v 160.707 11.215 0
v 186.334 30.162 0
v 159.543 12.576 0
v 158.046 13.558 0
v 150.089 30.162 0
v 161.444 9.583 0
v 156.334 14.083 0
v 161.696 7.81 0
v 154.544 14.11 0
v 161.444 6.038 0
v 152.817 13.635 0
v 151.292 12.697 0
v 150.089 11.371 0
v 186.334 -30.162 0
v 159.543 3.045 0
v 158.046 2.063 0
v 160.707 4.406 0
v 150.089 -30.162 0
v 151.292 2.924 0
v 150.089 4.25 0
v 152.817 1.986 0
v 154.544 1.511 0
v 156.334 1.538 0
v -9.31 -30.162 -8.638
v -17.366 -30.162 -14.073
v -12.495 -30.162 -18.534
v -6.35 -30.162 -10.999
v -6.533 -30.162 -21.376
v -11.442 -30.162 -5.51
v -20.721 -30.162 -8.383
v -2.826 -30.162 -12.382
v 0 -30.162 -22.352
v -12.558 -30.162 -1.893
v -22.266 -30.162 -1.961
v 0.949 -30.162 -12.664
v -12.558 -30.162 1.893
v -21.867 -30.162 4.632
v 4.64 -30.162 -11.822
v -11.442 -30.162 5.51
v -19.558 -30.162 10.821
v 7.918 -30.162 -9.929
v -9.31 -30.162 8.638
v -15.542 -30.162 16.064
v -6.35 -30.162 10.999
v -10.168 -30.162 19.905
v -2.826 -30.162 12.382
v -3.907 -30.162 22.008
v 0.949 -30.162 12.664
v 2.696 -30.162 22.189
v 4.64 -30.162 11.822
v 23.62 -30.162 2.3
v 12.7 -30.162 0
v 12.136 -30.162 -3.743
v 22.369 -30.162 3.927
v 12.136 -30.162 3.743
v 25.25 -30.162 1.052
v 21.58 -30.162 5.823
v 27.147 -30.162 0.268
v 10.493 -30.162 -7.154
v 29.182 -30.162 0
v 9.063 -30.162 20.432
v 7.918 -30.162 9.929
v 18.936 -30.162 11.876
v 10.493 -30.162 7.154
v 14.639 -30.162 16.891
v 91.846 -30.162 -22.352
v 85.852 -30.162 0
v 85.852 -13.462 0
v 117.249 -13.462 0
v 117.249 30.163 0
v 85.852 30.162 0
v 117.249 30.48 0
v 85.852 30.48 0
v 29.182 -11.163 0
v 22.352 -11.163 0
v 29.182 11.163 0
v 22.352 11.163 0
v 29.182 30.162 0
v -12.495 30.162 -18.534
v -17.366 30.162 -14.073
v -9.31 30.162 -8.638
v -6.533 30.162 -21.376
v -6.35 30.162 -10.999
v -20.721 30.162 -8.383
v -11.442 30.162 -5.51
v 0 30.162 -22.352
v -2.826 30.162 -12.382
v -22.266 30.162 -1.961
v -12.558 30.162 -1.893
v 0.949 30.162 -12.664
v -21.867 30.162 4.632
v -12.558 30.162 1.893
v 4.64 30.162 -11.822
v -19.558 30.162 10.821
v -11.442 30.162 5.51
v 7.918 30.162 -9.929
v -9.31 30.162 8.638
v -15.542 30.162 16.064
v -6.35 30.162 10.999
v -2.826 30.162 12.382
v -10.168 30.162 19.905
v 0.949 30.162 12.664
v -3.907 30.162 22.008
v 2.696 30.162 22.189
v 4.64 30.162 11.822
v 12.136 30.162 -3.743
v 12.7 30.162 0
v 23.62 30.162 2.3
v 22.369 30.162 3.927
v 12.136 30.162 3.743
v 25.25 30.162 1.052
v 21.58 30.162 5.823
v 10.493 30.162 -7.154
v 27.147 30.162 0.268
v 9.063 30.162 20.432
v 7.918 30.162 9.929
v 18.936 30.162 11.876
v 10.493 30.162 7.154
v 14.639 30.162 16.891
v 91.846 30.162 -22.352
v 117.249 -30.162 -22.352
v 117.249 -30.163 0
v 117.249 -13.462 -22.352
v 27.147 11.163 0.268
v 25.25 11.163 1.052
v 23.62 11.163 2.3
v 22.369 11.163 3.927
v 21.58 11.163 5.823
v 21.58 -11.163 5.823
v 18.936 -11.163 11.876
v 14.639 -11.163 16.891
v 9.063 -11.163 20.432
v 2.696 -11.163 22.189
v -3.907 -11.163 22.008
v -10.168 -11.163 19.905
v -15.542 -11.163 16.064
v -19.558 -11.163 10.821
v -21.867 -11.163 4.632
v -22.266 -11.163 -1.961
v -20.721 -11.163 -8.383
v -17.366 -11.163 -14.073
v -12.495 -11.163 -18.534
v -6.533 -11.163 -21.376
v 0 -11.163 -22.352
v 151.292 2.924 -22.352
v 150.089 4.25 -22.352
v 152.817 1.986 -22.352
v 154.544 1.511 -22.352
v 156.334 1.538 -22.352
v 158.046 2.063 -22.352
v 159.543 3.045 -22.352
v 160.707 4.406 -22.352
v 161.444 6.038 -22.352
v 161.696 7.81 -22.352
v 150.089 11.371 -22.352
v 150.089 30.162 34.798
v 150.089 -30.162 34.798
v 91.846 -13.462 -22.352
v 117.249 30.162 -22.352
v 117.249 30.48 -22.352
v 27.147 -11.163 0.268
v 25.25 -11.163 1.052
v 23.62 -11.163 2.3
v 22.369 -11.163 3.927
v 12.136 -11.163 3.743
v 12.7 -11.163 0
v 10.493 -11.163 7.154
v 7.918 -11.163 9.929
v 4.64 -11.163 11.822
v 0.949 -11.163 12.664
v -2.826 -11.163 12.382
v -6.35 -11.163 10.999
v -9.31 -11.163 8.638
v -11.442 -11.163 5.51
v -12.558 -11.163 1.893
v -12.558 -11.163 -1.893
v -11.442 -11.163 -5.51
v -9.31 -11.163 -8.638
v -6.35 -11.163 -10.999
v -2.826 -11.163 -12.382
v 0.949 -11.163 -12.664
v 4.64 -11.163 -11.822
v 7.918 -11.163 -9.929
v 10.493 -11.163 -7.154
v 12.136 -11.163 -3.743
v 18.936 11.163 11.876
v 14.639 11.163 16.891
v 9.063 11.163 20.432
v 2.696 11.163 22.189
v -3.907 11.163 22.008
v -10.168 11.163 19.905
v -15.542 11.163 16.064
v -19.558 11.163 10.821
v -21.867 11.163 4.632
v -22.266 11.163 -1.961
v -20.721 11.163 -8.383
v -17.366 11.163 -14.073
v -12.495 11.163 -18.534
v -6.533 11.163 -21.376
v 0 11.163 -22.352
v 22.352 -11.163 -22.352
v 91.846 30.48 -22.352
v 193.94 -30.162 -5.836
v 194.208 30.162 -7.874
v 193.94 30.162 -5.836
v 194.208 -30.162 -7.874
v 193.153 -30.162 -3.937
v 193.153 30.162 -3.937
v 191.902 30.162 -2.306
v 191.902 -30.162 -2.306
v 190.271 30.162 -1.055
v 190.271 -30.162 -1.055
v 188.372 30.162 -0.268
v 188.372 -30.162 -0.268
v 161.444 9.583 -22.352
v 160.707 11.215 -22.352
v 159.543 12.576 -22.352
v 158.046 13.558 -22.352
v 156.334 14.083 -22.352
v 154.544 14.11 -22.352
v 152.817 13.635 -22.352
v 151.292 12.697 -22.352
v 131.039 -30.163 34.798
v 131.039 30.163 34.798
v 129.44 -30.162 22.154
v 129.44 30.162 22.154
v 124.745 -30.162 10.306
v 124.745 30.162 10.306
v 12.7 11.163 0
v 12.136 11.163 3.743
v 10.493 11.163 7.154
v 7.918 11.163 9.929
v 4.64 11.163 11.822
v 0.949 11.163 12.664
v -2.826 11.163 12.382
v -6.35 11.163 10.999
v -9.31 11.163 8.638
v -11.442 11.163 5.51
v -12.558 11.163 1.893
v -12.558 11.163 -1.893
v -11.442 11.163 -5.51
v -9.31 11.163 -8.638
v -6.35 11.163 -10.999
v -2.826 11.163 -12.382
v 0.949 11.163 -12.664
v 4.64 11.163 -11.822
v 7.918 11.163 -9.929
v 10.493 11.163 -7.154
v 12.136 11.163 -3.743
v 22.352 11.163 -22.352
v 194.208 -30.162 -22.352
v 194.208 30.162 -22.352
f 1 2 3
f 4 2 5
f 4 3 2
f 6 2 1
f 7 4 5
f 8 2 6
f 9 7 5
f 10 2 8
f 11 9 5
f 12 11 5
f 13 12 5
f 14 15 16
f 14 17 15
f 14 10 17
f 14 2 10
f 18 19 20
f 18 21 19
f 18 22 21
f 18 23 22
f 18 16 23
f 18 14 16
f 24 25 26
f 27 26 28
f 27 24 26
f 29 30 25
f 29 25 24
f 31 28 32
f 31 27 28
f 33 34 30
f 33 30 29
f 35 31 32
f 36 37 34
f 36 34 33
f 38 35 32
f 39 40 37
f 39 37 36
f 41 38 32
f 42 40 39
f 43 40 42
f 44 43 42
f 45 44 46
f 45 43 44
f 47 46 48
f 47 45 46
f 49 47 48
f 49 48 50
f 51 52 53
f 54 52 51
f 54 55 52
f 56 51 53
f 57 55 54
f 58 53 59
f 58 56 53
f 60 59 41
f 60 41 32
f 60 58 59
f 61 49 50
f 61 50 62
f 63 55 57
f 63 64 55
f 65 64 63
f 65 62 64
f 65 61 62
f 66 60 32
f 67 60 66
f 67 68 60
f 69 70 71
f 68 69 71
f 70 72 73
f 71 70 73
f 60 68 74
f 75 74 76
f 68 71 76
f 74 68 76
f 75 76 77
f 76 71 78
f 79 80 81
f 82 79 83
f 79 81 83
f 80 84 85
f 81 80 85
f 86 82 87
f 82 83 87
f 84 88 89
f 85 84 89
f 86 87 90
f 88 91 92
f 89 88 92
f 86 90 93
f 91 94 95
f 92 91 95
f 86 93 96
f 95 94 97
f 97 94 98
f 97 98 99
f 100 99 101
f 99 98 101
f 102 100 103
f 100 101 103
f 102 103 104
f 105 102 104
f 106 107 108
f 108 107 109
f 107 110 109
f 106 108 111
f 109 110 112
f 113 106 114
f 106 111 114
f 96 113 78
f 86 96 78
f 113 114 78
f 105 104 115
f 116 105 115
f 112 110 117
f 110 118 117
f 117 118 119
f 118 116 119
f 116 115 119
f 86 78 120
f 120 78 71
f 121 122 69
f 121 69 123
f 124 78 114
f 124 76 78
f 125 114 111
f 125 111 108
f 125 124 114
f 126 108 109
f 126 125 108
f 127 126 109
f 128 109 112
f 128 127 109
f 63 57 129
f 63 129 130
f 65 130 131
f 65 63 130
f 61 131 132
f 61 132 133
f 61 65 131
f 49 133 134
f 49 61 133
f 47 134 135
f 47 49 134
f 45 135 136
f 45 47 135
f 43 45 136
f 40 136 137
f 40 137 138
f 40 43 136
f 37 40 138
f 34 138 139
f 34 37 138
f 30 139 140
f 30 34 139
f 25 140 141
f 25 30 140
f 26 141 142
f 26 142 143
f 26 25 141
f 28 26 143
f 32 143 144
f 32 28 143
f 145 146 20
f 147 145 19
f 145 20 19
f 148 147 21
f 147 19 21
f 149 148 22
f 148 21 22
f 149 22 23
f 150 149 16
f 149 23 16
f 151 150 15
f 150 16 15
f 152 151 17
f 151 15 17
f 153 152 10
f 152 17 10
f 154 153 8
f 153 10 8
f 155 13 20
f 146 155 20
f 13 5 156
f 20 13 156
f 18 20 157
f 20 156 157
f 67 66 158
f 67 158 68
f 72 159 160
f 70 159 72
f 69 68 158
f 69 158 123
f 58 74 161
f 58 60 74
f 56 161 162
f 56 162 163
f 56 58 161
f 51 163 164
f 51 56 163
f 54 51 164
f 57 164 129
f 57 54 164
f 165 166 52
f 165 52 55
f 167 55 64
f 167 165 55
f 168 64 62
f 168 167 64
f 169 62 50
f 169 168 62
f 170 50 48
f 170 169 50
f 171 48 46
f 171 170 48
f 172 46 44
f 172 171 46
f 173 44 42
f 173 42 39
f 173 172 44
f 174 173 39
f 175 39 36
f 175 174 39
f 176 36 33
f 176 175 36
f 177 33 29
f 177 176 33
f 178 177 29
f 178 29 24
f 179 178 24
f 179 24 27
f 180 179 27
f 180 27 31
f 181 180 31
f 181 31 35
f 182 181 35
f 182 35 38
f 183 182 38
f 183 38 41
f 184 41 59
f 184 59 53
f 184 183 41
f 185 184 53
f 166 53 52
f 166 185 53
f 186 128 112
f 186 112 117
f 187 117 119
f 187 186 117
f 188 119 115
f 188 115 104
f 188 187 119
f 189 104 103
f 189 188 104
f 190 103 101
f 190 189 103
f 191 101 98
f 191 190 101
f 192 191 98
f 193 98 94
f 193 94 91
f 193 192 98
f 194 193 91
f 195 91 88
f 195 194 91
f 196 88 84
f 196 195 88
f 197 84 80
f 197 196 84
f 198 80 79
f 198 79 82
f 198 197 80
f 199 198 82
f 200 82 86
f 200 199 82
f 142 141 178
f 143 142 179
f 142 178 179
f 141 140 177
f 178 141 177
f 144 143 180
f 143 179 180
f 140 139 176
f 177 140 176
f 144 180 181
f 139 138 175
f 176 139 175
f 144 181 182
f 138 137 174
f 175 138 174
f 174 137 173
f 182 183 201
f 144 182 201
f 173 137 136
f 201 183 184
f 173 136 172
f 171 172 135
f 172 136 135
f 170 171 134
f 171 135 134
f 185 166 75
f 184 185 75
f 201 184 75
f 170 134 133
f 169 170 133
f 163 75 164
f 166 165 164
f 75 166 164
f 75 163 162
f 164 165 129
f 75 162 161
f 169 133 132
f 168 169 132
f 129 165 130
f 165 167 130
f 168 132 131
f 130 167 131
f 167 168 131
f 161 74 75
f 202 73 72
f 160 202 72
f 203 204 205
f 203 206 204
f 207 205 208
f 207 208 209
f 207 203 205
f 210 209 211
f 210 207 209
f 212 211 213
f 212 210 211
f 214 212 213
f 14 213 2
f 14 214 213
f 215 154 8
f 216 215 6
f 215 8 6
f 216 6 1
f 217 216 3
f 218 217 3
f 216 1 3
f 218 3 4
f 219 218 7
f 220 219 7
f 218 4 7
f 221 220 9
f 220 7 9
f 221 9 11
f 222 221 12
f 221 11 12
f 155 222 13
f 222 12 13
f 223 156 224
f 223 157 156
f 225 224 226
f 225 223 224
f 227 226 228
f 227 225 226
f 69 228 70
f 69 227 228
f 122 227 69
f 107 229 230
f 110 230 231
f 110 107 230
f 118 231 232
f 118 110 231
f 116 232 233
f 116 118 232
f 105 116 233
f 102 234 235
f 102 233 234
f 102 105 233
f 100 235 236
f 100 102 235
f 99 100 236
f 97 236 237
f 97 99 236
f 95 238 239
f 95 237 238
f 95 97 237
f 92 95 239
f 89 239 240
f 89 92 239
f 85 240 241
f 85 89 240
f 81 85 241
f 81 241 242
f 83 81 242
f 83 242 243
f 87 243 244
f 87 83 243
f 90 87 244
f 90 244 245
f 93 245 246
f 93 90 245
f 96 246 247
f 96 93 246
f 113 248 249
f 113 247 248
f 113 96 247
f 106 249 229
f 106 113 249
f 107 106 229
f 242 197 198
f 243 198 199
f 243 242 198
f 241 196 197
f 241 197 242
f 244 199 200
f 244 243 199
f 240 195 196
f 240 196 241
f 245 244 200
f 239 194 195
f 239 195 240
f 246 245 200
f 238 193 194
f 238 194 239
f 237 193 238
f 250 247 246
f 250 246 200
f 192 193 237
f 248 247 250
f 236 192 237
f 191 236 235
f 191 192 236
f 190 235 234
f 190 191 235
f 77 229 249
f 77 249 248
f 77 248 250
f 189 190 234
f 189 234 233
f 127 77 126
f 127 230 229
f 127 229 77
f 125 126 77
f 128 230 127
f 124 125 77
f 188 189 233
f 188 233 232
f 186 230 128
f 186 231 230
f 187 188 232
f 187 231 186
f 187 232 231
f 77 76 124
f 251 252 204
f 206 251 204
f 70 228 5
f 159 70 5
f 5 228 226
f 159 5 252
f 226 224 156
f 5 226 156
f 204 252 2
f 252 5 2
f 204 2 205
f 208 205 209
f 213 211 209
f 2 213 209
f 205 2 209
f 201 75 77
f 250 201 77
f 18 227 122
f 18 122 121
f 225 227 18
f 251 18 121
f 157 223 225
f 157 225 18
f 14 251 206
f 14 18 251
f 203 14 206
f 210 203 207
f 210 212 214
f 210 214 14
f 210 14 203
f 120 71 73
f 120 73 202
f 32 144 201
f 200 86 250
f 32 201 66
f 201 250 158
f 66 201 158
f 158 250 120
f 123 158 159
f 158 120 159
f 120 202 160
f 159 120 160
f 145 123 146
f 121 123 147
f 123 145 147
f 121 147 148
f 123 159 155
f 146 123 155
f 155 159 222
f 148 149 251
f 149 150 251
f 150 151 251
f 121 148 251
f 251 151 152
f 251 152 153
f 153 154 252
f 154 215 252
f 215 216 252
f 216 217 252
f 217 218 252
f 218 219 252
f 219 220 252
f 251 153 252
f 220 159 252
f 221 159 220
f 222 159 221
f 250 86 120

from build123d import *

# Parameters (mm, degrees)
F0_R     = 12.7
F1_DEPTH = 30.1625
F2_R     = 6.35
F3_DEPTH = 34.799
F2_W     = 54.5219902415
F2_H     = 22.3266
F4_DEPTH = 63.5
F5_DEPTH = 30.1625
F6_R     = 7.874
F7_DEPTH = 30.48
F8_DEPTH = 13.462
F9_DEPTH = 25.4
F10_R    = 7.874


with BuildPart() as f1:
    # F0 (on Front) → F1 (new body, symmetric)
    with BuildSketch(Plane.XZ):
        Polygon((85.852, 0), (22.352, 0), (22.352, -22.352), (91.8464, -22.352), align=None)
        with BuildLine():
            Line((22.352, -22.352), (22.352, 0))
            ThreePointArc((22.352, 0), (-15.8052507731, 15.8052507731), (0, -22.352))
            Line((0, -22.352), (22.352, -22.352))
        make_face()
        Circle(F0_R, mode=Mode.SUBTRACT)
    extrude(amount=F1_DEPTH, both=True)

    # F2 (on face) → F4 (cut, symmetric)
    with BuildSketch(Plane.XY):
        with Locations((-4.9089951208, 0)):
            Rectangle(F2_W, F2_H)
    extrude(amount=F4_DEPTH, both=True, mode=Mode.SUBTRACT)

    # F6
    f6_edges = [f1.edges().sort_by_distance(p)[0] for p in [
        (22.352, -20.6629, 0),
        (22.352, 20.6629, 0),
    ]]
    fillet(f6_edges, radius=F6_R)



with BuildPart() as f1b:
    # F0 (on Front) → F1, piece 2 (new body, symmetric)
    with BuildSketch(Plane.XZ):
        Polygon((117.2485877871, 0), (117.2485877871, -22.352), (194.2084, -22.352), (194.2084, 0), (150.0886, 0), align=None)
        with BuildLine():
            ThreePointArc((131.0386, 34.798), (127.4654323074, 16.0825969798), (117.2485877871, 0))
            Line((117.2485877871, 0), (150.0886, 0))
            Line((150.0886, 0), (150.0886, 34.798))
            Line((150.0886, 34.798), (131.0386, 34.798))
        make_face()
    extrude(amount=F1_DEPTH, both=True)

    # F2 (on face) → F3 (cut, through all)
    with BuildSketch(Plane.XY):
        with Locations((155.3464, 7.8105)):
            Circle(F2_R)
    extrude(amount=F3_DEPTH, mode=Mode.SUBTRACT)

    # F0 (on Front) → F5 (join, symmetric)
    with BuildSketch(Plane.XZ):
        with BuildLine():
            ThreePointArc((131.0386, 34.798), (127.4654323074, 16.0825969798), (117.2485877871, 0))
            Line((117.2485877871, 0), (150.0886, 0))
            Line((150.0886, 0), (150.0886, 34.798))
            Line((150.0886, 34.798), (131.0386, 34.798))
        make_face()
    extrude(amount=F5_DEPTH, both=True)


with BuildPart() as f7:
    # F0 (on Front) → F7 (new body)
    with BuildSketch(Plane.XZ):
        Polygon((108.2802, 0), (85.852, 0), (91.8464, -22.352), (117.2485877871, -22.352), (117.2485877871, 0), (117.2464, 0), align=None)
    extrude(amount=-F7_DEPTH)


with BuildPart() as f1_1:
    add(f1.part)

    add(f1b.part)  # F8 merges F1b

    add(f7.part)  # F8 merges F7
    # F0 (on Front) → F8 (join)
    with BuildSketch(Plane.XZ):
        Polygon((108.2802, 0), (85.852, 0), (91.8464, -22.352), (117.2485877871, -22.352), (117.2485877871, 0), (117.2464, 0), align=None)
    extrude(amount=F8_DEPTH)

    # F2 (on face) → F9 (cut)
    with BuildSketch(Plane.XY):
        with BuildLine():
            ThreePointArc((150.0886, 4.2498765771), (157.2085855439, 1.7396874514), (161.6964, 7.8105))
            ThreePointArc((161.6964, 7.8105), (157.2085855439, 13.8813125486), (150.0886, 11.3711234229))
            Line((150.0886, 11.3711234229), (150.0886, 4.2498765771))
        make_face()
    extrude(amount=-F9_DEPTH, mode=Mode.SUBTRACT)

    # F10
    f10_edges = [f1_1.edges().sort_by_distance(p)[0] for p in [
        (194.2084, 0, 0),
    ]]
    fillet(f10_edges, radius=F10_R)


solid = f1_1.part
